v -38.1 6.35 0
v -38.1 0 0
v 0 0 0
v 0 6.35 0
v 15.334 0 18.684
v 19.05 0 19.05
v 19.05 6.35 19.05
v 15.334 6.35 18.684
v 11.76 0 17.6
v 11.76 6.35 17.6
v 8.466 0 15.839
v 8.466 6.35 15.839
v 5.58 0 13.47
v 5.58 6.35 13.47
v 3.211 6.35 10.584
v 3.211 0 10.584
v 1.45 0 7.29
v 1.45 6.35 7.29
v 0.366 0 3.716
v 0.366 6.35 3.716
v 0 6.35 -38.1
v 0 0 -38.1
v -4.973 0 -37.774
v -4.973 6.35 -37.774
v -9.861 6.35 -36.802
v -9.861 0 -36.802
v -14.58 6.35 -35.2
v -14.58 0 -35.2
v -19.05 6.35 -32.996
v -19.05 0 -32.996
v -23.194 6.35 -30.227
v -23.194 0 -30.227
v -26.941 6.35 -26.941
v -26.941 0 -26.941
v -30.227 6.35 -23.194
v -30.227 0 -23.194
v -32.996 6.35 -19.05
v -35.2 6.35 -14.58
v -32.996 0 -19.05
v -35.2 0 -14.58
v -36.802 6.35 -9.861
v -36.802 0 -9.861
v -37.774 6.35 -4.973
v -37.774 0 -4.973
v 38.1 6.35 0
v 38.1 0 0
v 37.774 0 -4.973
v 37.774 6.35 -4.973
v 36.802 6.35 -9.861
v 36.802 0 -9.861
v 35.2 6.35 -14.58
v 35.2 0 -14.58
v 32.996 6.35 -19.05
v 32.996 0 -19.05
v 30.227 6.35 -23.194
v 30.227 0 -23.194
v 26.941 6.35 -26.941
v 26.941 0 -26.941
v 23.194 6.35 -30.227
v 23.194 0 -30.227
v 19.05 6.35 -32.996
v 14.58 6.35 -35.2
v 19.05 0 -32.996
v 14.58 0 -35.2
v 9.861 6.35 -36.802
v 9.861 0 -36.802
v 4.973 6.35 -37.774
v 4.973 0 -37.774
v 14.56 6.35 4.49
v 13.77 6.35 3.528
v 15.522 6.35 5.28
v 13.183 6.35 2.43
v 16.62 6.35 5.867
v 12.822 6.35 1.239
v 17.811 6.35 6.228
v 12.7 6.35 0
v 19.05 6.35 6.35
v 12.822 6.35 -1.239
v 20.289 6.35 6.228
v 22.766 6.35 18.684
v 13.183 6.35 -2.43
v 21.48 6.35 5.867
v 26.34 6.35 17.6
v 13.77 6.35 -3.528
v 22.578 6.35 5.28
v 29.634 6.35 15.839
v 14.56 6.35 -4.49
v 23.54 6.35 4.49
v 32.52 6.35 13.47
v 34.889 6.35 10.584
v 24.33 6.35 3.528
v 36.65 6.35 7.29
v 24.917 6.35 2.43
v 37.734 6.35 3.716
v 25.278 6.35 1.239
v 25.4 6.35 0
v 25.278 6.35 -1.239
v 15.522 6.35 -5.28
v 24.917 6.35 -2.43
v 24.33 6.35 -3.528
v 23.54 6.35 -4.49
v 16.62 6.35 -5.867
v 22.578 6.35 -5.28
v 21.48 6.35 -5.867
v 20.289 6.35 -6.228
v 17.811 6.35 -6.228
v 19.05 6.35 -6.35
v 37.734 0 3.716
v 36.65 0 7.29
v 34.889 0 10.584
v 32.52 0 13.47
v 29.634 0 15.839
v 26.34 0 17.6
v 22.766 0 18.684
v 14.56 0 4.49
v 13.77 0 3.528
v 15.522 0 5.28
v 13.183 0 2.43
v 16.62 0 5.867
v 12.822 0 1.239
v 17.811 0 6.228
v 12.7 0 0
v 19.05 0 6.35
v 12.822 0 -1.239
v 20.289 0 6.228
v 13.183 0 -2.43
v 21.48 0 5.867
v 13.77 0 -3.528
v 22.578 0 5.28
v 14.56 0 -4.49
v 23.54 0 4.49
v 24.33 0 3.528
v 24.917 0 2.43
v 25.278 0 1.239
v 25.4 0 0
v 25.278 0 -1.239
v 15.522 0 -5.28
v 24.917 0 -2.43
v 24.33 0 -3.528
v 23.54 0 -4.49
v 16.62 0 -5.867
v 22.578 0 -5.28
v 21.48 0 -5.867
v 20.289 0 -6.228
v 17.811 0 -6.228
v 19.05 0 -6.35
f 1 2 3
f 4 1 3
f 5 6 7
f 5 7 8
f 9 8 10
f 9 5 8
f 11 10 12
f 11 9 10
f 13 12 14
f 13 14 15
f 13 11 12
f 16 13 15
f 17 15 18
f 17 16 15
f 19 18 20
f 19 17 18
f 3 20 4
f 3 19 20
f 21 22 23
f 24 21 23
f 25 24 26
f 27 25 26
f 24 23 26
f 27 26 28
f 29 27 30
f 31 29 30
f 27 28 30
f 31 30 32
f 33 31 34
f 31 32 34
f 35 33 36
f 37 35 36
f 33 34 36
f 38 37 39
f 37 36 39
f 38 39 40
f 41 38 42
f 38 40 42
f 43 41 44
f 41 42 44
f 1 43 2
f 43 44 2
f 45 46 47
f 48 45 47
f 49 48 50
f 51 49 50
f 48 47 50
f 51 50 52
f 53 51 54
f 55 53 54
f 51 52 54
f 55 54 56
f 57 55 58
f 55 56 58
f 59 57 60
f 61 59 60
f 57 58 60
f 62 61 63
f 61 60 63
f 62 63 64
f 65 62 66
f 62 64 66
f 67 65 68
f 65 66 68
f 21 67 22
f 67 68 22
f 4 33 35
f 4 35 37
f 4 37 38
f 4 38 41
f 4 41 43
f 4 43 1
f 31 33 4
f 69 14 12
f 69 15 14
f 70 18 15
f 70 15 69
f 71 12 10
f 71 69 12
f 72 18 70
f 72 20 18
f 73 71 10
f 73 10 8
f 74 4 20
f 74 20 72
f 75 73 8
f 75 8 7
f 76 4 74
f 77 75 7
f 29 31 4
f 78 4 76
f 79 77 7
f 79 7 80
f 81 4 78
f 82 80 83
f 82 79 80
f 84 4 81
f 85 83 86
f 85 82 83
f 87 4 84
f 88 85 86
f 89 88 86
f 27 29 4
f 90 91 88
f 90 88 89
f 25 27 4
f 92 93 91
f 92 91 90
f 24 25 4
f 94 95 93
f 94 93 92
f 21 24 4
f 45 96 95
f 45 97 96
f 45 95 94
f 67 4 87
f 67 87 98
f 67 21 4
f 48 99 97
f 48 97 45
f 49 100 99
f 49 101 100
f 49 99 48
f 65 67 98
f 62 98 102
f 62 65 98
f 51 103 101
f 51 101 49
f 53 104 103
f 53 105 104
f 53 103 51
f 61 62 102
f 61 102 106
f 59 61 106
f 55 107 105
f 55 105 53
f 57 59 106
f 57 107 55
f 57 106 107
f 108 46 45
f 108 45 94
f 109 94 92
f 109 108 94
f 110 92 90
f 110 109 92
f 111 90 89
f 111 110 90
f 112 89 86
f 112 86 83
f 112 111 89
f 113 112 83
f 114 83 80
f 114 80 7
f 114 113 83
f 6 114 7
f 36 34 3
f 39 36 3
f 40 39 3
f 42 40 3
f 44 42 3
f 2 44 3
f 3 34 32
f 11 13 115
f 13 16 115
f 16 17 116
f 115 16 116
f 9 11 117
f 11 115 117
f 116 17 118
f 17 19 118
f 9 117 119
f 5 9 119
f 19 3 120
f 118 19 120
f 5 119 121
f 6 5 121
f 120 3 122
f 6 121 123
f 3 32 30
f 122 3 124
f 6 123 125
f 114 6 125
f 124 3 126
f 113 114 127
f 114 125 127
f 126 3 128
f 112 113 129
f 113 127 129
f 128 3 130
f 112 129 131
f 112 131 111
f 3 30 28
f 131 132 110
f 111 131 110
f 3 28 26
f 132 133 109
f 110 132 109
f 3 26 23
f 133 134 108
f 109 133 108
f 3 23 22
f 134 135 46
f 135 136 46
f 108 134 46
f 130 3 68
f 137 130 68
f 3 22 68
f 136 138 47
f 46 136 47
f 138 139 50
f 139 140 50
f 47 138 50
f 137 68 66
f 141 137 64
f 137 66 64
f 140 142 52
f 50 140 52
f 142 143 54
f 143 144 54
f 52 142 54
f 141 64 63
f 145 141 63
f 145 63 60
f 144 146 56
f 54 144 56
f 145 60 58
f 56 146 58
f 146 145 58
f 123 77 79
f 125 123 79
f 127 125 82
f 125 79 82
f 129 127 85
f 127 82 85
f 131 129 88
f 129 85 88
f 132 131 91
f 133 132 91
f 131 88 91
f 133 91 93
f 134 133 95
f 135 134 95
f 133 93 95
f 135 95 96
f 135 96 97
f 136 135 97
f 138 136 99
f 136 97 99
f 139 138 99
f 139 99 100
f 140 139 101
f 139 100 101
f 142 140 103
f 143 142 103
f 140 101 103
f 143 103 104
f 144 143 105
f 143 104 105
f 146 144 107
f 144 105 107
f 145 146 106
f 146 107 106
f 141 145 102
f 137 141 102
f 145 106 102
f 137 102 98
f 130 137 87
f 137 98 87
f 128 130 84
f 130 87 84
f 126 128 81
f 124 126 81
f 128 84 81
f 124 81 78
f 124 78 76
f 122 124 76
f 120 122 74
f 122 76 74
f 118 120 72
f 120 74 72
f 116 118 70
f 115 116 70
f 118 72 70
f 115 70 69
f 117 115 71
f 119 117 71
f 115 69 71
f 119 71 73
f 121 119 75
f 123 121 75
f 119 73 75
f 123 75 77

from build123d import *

# Parameters (mm, degrees)
BOSS_EXTRUDE2_DEPTH = 6.35
SKETCH3_R           = 6.35
CUT_EXTRUDE1_DEPTH  = 6.35


with BuildPart() as part:
    # Sketch2 → Boss-Extrude2 (new body)
    with BuildSketch(Plane(origin=(0, 0, 0), x_dir=(1, 0, 0), z_dir=(0, 1, 0))):
        with BuildLine():
            Line((0, 0), (0, 38.1))
            ThreePointArc((0, 38.1), (-26.940768363, 26.940768363), (-38.1, 0))
            Line((-38.1, 0), (0, 0))
        make_face()
        with BuildLine():
            Line((19.05, 0), (38.1, 0))
            ThreePointArc((38.1, 0), (26.940768363, 26.940768363), (0, 38.1))
            Line((0, 38.1), (0, 0))
            Line((0, 0), (19.05, 0))
        make_face()
        with BuildLine():
            Line((19.05, -19.05), (19.05, 0))
            Line((19.05, 0), (38.1, 0))
            ThreePointArc((38.1, 0), (32.520384182, -13.470384182), (19.05, -19.05))
        make_face()
        with BuildLine():
            Line((0, 0), (19.05, 0))
            Line((19.05, 0), (19.05, -19.05))
            ThreePointArc((19.05, -19.05), (5.579615818, -13.470384182), (0, 0))
        make_face()
    extrude(amount=BOSS_EXTRUDE2_DEPTH)

    # Sketch3 → Cut-Extrude1 (cut)
    with BuildSketch(Plane(origin=(0, 6.35, 0), x_dir=(1, 0, 0), z_dir=(0, 1, 0))):
        with Locations(Location((19.05, 0, 0), (0, 0, 270))):
            Circle(SKETCH3_R)
    extrude(amount=-CUT_EXTRUDE1_DEPTH, mode=Mode.SUBTRACT)


solid = part.part
